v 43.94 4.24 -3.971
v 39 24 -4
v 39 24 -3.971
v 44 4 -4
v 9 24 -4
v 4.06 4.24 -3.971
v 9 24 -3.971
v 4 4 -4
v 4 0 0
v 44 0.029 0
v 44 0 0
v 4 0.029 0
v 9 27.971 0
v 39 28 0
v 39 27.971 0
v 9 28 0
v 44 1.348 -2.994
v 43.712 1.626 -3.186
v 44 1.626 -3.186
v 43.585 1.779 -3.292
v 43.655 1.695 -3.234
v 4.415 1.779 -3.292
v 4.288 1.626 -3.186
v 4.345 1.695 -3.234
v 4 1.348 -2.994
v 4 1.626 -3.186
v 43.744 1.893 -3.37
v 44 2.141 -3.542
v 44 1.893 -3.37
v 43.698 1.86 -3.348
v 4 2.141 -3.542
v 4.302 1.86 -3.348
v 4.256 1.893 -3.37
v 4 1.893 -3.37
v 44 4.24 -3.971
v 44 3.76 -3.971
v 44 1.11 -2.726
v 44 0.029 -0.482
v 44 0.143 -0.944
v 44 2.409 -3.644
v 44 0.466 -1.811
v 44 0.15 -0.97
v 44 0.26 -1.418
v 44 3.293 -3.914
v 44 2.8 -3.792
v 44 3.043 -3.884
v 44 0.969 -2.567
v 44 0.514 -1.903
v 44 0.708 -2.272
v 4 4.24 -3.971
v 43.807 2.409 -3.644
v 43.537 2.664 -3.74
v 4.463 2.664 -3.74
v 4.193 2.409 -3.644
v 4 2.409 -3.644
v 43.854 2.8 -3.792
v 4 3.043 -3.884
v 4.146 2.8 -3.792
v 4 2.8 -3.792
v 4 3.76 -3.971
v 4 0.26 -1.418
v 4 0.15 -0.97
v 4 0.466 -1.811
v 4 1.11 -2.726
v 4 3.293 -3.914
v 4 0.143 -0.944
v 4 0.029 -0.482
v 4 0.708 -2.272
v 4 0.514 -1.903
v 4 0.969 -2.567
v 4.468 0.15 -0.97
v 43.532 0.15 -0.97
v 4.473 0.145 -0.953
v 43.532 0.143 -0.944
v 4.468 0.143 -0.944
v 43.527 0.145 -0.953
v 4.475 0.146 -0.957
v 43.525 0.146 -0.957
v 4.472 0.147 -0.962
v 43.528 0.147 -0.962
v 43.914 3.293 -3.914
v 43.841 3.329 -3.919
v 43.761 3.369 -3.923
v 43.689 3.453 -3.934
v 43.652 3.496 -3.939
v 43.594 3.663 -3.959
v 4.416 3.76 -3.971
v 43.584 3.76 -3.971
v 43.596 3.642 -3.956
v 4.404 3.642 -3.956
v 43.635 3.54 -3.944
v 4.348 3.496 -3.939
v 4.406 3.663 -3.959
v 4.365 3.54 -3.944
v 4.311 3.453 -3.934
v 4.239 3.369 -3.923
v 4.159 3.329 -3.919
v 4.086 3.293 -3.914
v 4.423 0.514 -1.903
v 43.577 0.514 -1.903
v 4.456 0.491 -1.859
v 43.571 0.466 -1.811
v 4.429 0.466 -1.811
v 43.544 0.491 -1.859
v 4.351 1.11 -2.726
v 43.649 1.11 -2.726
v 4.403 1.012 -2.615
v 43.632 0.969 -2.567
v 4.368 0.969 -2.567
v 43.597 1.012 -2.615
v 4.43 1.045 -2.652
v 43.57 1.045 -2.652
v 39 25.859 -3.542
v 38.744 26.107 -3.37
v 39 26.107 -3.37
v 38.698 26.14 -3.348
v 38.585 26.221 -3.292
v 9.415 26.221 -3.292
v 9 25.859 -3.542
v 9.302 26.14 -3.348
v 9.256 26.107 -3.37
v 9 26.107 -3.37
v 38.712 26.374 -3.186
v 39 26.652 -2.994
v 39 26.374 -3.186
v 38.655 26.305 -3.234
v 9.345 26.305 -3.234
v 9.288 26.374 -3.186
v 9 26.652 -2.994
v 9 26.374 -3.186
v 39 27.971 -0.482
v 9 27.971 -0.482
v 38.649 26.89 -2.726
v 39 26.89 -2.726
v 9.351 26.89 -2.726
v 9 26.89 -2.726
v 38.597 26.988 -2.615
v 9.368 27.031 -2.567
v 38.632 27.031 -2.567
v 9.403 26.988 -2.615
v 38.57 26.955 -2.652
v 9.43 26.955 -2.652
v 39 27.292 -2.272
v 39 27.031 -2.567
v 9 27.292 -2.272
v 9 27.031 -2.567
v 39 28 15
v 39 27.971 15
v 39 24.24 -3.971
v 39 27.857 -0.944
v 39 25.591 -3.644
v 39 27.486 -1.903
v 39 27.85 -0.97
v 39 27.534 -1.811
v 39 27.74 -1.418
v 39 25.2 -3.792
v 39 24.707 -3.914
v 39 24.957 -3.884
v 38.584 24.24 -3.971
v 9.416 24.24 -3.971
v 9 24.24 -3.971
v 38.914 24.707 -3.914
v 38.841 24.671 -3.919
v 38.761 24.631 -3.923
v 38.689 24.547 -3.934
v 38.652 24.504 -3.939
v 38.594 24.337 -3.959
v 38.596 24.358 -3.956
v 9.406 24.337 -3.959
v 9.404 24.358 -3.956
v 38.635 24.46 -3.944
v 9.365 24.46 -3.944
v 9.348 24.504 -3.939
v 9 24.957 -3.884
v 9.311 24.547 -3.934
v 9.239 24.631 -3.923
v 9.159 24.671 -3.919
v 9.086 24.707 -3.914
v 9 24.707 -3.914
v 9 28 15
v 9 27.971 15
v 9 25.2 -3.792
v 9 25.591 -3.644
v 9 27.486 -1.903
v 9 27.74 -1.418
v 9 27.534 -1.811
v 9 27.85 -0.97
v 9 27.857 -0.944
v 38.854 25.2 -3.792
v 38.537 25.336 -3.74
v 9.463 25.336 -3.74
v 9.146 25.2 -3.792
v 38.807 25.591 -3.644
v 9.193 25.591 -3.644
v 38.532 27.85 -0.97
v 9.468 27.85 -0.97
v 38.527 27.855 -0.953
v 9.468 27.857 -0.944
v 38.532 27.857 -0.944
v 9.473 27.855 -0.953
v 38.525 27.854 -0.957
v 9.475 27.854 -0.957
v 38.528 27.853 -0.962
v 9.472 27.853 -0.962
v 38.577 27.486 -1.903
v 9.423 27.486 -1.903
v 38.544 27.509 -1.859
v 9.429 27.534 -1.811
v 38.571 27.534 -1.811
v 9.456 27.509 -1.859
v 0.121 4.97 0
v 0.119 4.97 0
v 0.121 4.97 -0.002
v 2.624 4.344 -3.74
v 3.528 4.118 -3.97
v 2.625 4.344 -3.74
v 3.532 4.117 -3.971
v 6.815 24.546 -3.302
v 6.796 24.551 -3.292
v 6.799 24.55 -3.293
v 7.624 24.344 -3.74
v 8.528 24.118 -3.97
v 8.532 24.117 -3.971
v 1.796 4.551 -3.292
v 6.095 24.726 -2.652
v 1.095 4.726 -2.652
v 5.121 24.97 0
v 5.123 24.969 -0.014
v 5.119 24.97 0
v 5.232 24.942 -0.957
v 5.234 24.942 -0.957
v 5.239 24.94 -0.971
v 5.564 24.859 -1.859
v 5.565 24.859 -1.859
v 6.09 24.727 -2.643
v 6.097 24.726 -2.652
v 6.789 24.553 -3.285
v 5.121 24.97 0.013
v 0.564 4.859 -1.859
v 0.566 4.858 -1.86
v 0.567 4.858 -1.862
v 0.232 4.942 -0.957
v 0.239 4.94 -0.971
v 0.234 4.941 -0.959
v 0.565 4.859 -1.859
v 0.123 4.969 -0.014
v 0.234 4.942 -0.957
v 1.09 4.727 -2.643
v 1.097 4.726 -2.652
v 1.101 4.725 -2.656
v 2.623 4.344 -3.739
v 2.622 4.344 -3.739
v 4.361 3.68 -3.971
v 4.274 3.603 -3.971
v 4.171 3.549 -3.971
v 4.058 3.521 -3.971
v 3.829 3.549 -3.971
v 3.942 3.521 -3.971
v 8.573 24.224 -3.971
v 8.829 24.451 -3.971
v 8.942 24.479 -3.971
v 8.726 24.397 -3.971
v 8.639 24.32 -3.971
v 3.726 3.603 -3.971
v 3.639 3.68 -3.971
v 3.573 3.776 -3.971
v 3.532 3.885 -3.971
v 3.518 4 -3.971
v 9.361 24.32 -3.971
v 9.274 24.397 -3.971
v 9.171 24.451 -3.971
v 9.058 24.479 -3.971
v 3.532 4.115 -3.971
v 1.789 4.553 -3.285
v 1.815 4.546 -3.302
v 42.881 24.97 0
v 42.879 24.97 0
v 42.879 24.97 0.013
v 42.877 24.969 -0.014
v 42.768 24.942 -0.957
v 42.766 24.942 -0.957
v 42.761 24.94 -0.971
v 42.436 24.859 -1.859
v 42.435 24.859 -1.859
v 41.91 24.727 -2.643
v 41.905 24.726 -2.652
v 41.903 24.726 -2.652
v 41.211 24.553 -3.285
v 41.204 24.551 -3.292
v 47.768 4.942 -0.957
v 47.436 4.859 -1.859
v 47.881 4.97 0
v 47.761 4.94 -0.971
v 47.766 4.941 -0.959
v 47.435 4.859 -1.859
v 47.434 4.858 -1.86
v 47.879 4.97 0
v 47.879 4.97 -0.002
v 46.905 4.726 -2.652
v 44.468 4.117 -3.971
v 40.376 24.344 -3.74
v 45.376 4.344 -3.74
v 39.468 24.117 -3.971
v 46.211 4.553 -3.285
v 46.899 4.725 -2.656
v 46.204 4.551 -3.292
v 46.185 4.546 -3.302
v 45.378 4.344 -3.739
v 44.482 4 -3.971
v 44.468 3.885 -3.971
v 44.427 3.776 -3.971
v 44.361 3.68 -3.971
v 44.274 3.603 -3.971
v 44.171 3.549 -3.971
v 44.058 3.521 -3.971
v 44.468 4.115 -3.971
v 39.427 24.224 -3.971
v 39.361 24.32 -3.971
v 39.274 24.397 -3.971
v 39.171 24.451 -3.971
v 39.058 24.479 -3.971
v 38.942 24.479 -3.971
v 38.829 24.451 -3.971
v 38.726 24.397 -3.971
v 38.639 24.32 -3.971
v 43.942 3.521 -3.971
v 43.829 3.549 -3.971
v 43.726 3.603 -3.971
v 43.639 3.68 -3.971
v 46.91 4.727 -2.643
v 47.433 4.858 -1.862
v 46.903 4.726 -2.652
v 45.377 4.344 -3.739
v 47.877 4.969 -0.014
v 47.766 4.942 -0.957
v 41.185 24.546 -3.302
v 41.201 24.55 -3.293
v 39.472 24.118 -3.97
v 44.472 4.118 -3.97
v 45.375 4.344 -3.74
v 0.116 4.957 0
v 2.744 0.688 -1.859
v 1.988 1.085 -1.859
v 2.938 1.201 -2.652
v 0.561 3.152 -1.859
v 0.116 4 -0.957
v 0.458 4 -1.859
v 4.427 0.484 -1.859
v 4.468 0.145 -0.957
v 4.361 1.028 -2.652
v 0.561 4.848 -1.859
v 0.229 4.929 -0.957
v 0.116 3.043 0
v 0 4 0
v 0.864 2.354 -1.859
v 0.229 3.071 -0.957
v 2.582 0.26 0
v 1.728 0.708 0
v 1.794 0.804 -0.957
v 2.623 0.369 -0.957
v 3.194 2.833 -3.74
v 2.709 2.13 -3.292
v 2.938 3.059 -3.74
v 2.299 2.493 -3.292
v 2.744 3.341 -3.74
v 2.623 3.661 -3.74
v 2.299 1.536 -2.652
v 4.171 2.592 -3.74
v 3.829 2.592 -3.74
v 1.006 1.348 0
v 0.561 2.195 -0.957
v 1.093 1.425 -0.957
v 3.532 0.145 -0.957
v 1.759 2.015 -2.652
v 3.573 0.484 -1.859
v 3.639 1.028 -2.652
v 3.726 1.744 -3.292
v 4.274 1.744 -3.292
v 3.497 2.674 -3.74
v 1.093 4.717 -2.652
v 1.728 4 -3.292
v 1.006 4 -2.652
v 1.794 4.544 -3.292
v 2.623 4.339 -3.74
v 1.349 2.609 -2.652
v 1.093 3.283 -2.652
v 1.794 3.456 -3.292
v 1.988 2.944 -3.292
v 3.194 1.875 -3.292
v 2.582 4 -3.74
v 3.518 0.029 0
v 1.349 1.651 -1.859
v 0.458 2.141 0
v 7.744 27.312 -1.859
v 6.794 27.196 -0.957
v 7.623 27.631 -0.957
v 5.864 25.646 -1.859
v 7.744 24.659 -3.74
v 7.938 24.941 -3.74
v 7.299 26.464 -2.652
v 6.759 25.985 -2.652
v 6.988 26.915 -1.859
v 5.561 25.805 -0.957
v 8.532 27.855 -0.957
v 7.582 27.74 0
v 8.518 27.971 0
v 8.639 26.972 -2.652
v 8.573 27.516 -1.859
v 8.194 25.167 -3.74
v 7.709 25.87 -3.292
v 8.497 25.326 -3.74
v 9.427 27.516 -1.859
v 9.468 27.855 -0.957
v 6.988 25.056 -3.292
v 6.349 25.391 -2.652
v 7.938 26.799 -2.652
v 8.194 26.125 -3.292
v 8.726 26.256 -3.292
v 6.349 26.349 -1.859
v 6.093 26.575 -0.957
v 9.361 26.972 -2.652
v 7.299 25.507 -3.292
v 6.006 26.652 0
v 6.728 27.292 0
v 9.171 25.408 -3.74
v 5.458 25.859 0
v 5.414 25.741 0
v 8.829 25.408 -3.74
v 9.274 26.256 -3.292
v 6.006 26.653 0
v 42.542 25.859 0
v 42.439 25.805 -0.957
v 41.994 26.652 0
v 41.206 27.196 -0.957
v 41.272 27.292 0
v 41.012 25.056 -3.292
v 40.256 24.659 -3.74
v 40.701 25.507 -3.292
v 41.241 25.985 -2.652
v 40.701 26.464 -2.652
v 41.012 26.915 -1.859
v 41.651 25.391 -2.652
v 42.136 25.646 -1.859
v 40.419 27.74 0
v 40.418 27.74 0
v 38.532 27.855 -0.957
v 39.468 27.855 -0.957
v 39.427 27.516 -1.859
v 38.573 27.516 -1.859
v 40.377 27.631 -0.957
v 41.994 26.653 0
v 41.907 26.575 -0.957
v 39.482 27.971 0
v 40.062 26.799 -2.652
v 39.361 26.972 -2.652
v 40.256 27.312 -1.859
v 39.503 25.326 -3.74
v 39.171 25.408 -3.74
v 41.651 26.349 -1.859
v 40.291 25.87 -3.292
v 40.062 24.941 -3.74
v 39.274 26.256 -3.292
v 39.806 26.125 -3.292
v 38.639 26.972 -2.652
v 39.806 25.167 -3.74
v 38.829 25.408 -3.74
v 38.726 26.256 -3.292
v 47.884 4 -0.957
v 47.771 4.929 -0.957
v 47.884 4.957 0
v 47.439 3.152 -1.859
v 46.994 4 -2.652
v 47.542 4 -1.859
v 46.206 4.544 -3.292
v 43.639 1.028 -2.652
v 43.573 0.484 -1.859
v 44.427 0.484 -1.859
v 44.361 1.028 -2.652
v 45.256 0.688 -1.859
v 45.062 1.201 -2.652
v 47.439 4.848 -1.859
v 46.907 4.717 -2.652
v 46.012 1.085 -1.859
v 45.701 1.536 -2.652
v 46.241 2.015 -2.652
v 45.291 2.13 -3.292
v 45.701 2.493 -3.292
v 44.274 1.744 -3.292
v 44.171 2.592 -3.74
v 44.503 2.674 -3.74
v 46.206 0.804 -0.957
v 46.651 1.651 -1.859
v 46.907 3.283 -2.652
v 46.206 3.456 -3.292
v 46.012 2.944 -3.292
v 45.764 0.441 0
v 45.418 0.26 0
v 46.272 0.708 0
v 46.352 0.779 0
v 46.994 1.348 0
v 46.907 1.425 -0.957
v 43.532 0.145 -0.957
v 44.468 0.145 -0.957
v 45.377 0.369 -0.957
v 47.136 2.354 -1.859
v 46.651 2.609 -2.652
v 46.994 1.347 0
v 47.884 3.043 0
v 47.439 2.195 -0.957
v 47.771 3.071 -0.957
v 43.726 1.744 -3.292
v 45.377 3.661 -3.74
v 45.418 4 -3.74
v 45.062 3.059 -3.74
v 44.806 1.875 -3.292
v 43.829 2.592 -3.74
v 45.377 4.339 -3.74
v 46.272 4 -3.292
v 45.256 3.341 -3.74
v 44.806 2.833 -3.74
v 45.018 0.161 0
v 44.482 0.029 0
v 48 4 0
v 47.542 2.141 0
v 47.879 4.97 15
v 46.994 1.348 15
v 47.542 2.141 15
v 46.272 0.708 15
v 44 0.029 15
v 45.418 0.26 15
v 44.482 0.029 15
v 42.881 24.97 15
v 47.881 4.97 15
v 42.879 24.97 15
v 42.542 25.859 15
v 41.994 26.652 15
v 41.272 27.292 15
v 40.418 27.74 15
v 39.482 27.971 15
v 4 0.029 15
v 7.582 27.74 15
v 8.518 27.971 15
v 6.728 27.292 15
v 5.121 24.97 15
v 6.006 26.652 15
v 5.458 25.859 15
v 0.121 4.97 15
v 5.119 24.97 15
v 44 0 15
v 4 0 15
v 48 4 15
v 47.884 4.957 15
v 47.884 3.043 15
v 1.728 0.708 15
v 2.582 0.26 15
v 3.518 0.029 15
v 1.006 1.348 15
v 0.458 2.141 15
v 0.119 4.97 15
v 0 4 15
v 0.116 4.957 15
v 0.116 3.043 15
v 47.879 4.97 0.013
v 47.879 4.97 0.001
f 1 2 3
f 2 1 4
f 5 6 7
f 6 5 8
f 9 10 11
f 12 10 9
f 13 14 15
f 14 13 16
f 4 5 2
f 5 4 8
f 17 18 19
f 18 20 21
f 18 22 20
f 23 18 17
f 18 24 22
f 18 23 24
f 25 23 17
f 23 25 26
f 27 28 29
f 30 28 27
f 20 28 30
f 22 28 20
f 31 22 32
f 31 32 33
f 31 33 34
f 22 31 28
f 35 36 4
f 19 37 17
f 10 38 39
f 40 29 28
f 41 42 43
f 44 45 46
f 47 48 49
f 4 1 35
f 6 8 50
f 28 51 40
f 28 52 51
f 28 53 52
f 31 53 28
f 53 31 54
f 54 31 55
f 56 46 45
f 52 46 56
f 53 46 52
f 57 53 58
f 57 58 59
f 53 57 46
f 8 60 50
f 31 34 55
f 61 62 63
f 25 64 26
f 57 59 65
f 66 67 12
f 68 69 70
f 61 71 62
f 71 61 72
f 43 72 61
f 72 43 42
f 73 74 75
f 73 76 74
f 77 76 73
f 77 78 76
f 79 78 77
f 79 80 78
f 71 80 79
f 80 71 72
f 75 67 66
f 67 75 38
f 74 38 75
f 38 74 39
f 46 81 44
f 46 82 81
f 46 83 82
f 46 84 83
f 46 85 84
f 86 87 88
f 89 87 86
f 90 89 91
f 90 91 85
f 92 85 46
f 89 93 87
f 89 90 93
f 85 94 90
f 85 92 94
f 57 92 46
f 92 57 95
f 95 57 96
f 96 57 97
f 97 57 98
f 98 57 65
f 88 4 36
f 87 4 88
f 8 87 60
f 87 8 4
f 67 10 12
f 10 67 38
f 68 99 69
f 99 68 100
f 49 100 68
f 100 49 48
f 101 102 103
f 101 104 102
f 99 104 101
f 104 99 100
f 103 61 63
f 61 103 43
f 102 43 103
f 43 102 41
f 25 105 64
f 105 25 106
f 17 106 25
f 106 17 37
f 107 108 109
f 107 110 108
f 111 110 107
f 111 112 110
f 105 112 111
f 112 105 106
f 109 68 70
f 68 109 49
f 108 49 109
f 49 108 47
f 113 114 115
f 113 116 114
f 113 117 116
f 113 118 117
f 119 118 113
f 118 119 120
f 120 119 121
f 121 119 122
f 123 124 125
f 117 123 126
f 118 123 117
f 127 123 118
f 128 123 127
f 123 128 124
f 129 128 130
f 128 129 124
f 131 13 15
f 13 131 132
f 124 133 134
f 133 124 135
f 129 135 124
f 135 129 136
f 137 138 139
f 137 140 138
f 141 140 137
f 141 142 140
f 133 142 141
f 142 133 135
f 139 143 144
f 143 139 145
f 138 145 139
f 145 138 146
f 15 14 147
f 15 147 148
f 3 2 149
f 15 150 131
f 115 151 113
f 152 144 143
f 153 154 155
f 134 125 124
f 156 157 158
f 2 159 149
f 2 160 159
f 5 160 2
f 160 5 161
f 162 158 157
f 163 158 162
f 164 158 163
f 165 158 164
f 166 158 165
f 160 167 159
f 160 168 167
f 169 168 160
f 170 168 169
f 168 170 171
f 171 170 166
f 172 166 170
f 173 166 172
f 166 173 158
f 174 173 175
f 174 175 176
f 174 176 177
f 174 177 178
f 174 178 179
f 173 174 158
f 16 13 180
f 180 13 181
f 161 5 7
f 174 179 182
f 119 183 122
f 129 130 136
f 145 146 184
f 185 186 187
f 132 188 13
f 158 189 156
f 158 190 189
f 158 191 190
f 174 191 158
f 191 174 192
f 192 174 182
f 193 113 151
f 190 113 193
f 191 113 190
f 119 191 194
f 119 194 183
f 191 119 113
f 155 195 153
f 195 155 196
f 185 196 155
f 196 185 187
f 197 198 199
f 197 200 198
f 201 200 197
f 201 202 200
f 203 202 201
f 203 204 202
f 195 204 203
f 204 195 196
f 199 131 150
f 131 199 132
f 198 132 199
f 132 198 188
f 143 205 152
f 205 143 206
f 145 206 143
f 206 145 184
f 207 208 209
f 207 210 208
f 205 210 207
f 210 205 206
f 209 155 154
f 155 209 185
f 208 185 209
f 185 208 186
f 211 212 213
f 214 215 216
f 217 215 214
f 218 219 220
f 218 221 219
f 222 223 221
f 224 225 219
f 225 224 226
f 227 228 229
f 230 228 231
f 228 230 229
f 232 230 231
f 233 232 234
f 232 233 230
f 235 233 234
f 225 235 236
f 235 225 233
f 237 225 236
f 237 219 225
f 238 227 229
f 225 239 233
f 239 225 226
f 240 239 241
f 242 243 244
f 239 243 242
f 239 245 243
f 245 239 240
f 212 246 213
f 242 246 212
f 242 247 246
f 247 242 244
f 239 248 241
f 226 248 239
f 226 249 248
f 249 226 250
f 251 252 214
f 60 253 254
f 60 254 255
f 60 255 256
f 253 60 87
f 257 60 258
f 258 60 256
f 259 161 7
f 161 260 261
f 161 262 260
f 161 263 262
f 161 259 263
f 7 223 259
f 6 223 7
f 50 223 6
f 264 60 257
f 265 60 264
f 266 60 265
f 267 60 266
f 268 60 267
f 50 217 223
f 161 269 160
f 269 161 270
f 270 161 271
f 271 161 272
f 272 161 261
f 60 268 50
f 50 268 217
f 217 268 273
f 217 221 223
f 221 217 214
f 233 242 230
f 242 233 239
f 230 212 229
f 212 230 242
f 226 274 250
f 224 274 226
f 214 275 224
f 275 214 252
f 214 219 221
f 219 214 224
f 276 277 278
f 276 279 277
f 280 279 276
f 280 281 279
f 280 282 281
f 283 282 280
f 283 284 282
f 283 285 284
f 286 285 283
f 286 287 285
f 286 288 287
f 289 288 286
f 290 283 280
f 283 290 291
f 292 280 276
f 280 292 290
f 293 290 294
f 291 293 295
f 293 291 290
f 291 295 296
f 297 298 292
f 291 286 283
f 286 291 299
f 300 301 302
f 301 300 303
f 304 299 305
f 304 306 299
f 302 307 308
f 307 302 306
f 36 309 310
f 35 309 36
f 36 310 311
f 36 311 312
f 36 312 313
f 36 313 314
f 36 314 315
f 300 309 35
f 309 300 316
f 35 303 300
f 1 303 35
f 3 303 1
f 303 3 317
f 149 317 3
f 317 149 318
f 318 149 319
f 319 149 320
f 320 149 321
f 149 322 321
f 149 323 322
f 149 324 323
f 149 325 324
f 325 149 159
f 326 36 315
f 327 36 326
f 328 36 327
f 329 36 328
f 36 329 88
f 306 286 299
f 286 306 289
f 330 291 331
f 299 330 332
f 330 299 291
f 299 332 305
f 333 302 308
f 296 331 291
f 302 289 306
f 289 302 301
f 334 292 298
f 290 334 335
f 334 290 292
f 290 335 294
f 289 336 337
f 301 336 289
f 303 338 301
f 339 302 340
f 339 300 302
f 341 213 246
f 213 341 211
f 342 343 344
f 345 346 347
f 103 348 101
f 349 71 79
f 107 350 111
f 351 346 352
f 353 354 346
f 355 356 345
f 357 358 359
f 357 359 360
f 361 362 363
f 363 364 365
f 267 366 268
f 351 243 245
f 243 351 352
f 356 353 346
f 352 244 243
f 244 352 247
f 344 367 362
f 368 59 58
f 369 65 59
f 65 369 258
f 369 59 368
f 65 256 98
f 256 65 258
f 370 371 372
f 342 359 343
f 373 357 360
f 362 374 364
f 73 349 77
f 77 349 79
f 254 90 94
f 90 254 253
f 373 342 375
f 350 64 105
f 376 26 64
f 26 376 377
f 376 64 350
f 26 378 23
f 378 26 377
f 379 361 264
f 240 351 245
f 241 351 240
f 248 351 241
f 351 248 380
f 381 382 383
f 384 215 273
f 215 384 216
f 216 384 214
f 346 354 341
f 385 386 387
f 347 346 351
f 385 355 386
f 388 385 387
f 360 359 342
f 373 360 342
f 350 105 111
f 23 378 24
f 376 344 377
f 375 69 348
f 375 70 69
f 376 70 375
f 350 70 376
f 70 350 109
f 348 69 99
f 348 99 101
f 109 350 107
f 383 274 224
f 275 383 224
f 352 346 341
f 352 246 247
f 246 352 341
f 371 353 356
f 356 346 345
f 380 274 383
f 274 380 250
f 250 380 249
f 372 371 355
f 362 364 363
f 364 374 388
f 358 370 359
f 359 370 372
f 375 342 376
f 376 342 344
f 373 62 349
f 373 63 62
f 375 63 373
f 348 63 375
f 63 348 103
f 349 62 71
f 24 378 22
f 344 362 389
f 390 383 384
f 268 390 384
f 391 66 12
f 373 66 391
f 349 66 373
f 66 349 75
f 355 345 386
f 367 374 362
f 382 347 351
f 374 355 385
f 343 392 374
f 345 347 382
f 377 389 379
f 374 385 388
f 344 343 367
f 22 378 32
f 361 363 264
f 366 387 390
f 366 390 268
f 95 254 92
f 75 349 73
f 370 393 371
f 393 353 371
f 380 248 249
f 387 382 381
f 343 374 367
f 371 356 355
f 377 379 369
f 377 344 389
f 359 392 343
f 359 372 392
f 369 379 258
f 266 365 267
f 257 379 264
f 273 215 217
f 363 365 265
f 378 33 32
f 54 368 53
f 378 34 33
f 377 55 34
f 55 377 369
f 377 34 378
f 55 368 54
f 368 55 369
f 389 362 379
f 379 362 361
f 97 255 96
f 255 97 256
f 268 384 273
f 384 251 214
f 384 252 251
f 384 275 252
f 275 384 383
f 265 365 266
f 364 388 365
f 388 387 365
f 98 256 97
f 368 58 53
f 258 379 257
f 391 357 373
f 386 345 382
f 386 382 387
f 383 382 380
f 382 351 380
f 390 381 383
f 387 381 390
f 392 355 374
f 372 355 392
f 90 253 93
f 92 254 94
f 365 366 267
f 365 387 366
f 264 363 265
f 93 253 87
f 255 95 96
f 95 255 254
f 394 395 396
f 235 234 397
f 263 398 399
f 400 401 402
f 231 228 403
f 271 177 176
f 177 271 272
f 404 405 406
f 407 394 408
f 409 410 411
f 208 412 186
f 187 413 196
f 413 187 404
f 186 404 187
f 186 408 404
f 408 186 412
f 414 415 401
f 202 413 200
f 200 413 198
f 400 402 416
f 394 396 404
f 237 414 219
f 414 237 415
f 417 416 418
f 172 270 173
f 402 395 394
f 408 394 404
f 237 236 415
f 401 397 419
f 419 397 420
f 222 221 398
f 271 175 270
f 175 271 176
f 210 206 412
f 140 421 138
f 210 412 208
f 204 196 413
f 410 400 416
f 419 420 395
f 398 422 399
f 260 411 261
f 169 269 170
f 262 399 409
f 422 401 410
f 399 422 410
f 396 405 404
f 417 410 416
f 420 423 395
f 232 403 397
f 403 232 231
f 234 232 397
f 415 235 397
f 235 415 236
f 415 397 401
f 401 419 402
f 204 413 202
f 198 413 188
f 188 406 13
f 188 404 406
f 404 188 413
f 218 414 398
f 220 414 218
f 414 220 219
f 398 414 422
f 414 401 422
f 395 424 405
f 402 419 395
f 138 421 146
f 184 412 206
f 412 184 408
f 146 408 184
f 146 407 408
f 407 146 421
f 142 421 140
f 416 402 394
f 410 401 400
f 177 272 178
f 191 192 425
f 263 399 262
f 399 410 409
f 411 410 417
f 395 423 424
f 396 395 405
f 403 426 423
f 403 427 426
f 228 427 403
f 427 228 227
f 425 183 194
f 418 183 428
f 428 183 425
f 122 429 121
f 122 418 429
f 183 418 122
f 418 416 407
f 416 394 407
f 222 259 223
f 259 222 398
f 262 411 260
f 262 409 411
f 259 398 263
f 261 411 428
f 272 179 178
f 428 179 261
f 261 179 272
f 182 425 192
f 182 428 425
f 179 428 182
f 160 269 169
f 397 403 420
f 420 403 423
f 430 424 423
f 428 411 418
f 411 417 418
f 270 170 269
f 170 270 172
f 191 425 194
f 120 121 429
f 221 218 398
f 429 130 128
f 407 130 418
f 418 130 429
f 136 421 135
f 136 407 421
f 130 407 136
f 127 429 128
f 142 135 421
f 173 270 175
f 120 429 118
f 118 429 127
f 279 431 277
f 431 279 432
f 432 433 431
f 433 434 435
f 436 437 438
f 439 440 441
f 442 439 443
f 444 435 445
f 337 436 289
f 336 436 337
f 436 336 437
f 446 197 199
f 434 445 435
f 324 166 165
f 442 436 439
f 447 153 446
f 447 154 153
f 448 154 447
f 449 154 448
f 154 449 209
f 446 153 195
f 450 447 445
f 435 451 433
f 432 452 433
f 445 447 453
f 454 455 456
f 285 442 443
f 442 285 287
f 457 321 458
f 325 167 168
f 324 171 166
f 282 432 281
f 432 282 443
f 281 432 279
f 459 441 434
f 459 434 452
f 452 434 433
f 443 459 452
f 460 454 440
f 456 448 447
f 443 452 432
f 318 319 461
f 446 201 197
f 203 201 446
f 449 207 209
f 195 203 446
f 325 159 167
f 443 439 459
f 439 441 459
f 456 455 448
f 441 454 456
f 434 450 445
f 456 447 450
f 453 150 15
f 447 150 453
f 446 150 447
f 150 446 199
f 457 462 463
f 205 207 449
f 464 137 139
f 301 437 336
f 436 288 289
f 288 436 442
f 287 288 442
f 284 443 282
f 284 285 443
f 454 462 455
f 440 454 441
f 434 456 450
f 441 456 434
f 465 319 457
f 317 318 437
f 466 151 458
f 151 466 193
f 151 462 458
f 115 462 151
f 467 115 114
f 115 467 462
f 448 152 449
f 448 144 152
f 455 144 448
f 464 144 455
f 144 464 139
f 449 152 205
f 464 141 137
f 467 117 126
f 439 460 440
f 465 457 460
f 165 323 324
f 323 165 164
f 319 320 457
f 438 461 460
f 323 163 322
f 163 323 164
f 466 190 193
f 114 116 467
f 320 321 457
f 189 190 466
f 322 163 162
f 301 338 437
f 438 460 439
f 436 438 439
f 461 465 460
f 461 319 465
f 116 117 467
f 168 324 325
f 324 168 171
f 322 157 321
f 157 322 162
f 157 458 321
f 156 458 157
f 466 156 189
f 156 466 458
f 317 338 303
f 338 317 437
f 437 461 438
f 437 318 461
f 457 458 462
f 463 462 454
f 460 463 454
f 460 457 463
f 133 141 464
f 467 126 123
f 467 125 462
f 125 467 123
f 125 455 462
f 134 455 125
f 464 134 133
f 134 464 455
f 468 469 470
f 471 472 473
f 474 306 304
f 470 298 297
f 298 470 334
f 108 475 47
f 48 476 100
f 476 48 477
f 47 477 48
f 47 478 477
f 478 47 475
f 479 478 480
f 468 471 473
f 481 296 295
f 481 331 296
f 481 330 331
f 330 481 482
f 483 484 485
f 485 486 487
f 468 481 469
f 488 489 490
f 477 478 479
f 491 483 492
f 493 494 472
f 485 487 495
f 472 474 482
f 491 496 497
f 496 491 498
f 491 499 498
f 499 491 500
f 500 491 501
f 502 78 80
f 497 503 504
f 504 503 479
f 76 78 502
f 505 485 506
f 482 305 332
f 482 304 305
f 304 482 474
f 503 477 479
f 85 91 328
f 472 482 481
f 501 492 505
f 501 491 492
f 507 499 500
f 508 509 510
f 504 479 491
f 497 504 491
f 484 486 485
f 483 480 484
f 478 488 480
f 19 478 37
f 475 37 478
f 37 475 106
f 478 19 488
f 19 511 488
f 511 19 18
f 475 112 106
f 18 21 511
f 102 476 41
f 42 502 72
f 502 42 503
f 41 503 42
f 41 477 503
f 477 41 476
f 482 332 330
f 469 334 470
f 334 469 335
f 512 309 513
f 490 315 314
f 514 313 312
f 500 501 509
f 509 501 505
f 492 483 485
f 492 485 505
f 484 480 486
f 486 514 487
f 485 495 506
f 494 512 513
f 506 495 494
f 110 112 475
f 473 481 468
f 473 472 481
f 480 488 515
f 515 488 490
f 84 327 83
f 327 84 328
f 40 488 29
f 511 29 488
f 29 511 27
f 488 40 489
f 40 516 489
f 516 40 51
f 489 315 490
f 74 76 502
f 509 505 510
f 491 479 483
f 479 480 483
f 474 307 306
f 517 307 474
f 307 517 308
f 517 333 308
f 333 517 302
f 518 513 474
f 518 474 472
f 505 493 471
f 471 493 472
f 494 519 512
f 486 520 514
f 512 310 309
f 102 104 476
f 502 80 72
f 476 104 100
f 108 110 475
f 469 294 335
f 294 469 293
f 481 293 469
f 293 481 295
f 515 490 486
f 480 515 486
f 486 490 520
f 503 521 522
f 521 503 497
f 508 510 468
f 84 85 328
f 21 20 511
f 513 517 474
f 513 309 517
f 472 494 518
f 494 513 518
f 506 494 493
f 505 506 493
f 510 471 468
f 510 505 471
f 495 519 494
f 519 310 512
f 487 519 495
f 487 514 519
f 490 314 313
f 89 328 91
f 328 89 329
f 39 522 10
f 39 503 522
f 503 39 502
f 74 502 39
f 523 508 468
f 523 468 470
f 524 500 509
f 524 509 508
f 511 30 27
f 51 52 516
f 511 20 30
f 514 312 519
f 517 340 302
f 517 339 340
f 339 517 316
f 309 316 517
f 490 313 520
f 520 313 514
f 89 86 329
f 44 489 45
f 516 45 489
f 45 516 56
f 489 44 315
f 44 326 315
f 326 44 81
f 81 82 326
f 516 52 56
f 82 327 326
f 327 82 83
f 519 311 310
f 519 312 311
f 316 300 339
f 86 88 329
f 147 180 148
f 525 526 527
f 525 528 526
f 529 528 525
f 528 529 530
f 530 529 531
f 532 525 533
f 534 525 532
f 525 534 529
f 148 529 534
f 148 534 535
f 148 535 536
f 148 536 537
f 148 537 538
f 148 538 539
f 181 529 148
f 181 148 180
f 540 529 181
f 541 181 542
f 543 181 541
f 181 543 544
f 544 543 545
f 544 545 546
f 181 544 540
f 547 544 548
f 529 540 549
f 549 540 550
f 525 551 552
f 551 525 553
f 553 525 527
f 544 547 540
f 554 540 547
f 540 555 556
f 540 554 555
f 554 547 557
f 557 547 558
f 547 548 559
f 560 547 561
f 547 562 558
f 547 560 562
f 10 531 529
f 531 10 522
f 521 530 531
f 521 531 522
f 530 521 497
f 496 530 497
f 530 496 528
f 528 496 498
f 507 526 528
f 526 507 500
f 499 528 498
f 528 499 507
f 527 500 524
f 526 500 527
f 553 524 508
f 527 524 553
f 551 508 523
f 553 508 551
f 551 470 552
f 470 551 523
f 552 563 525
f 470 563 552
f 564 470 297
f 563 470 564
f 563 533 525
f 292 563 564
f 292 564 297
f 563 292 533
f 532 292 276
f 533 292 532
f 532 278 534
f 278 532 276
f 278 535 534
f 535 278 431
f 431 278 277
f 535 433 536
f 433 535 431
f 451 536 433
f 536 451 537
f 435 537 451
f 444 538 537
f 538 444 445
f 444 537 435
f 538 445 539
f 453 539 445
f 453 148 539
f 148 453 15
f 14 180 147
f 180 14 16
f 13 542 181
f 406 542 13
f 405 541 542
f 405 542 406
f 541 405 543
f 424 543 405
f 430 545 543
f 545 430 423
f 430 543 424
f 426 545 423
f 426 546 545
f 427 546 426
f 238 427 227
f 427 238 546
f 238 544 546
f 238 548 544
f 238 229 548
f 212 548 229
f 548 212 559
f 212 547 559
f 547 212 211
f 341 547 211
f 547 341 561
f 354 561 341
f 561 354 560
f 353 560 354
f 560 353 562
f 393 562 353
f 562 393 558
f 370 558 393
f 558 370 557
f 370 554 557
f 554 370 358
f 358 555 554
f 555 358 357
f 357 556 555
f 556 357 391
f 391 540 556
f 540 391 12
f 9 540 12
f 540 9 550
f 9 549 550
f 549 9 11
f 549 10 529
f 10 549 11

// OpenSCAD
// file: Objects.scad
module sphereCut(r, h, center=true) {
	d = 2 * r;
	h_corr = center ? r - h / 2 : r - h;
	translate([0,0,-h_corr])
		difference() {
			sphere(r);
			translate([0, 0, -h]) cube([d, d, d], center = true);
		}
}
* sphereCut(r=10, h=10, center=false);

module ellipse_prism(rx, ry, height, center = true)
{
	dx = center ? 0 : rx;
	dy = center ? 0 : ry;
  	translate([dx,dy,0]) scale([1, ry/rx, 1]) cylinder(h=height, r=rx, center=center);
}

module ellipsoid(rx,ry,rz, center=true){
	scale([1, ry/rx, rz/rx]) sphere(rx);
}

module roundTrapez(x1, x2, y, r){
	$fs=1;
	angle = atan((x1 - x2) / 2 / y); // clockwise around z-achse to reach left edge of trapezoid
	polygon(points=[
		[r                                      , 0],
		[r                                      , r],
		[r - r * cos(angle)                     , r + r * sin(angle)],
		[r - r * cos(angle) + (x1 - x2) / 2     , r + r * sin(angle) + y],
		[r                  + (x1 - x2) / 2     , r                  + y],
		[r                  + (x1 - x2) / 2     , r                  + y + r],
		[r                  + (x1 - x2) / 2 + x2, r                  + y + r],
		[r                  + (x1 - x2) / 2 + x2, r                  + y],
		[r + r * cos(angle) + (x1 - x2) / 2 + x2, r + r * sin(angle) + y],
		[r + r * cos(angle) + x1                , r + r * sin(angle)],
		[r                  + x1                , r],
		[r                  + x1                , 0]
	]);
	if (r > 0) {
		translate([r, r, 0]) circle(r);
		translate([r + (x1 - x2) / 2, r + y, 0]) circle(r);
		translate([r + (x1 - x2) / 2 + x2, r + y,0]) circle(r);
		translate([r + x1, r, 0]) circle(r);
	}
}

module trapez(x1, x2, y) {
	d = (x1 - x2) / 2;
	polygon(points=[
		[0     , 0],
		[d     , y],
		[d + x2, y],
		[x1    , 0]
	]);
}
*ellipse_prism(10,20,5, $fa=2, $fs=1);
*ellipsoid(10,20,5,false, $fa=2, $fs=0.5);
// main file
include <Objects.scad>

h_kante = 2;
printer_delta = 0.05;

module HalteRahmen(breite, tiefe, h, d) {
	delta = -printer_delta;
	difference() {
		translate([-delta/2, -delta/2, 0]) cube([breite+delta, tiefe+delta, h]);
		translate([-delta/2, -delta/2, h/2]) rotate([0,0,45]) cube([d,d,h], center=true);
		translate([breite+delta/2, -delta/2, h/2]) rotate([0,0,45]) cube([d,d,h], center=true);
		translate([breite+delta/2, tiefe+delta/2, h/2]) rotate([0,0,45]) cube([d,d,h], center=true);
		translate([-delta/2, tiefe+delta/2, h/2]) rotate([0,0,45]) cube([d,d,h], center=true);
	}
}


module HalfBox(x, y, z, rx, ry, rz) {
	innerX = x - 2 * rx;
	innerY = y - 2 * ry;
	translate([ 0, ry, rz]) cube([x, innerY, z - rz]);
	translate([rx,  0, rz]) cube([innerX, y, z - rz]);
	translate([rx, ry,  0]) cube([innerX, innerY, z]);
	// bottom cylinders
	translate([ rx + innerX/2, ry, rz]) rotate([0,90,0]) ellipse_prism(rx = rz, ry = ry, height = innerX);
	translate([ rx + innerX/2, ry + innerY, rz]) rotate([0,90,0]) ellipse_prism(rx = rz, ry = ry, height = innerX);
	translate([ rx, ry + innerY/2, rz]) rotate([90,0,0]) ellipse_prism(rx = rx, ry = rz, height = innerY);
	translate([ rx + innerX, ry + innerY/2, rz]) rotate([90,0,0]) ellipse_prism(rx = rx, ry = rz, height = innerY);
	// corner
	for (x = [rx, rx+innerX], y = [ry, ry+innerY]) {
		translate([x, y, (z+rz)/2]) ellipse_prism(rx = rx, ry = ry, height = z - rz);
		translate([x, y, rz]) ellipsoid(rx, ry,rz);
	}
}

module BoxBottom(x, y, z, rx=2, ry=2, rz=2) {
	HalfBox(x, y, z, rx, ry, rz);
	translate([rx / 2, ry / 2, z]) HalteRahmen(x - rx, y - ry, h_kante, d = max(rx/2, ry/2));
}

// Deckel
module BoxTop(x, y, z, rx=2, ry=2, rz=2) {
	difference() {
		translate([0, y, z]) rotate([180,0,0]) HalfBox(x, y, z, rx, ry, rz);
		translate([rx / 2, ry / 2, 0]) HalteRahmen(x - rx, y - ry, h_kante, d = max(rx/2, ry/2));
	}
}


module HalfTrapezoid(x1, x2, y, z, r) {
	$fs=1;
	angle = atan((x1 - x2) / 2 / y); // counter clockwise around z-achse to reach left edge of trapezoid
    linear_extrude(height=z)
		roundTrapez(x1,x2,y,r);
	if (r > 0) {
	    translate([r,r,-r])
		    linear_extrude(height=r)
				trapez(x1,x2,y);
		// bottom cylinders
		translate([r, r, 0]) rotate([0,90,0]) cylinder(r = r, h = x1);
		translate([r + (x1 - x2) / 2, r + y, 0]) rotate([0,90,0]) cylinder(r = r, h = x2);
		translate([r, r, 0]) rotate([0,0,-angle]) rotate([-90,0,0]) cylinder(r = r, h = y / cos(angle));
		translate([r + x1, r, 0]) rotate([0,0, angle]) rotate([-90,0,0]) cylinder(r = r, h = y / cos(angle));
		// corners
		translate([r, r, 0]) sphere(r);
		translate([r + (x1 - x2) / 2, r + y, 0]) sphere(r);
		translate([r + (x1 - x2) / 2 + x2, r + y, 0]) sphere(r);
		translate([r + x1, r, 0]) sphere(r);
	}
}

HalfTrapezoid(40, 30, 20, 15, 4);
/*
BoxTop(40, 30, 8, 2.5, 2.5, 2, $fn=32);
*/
